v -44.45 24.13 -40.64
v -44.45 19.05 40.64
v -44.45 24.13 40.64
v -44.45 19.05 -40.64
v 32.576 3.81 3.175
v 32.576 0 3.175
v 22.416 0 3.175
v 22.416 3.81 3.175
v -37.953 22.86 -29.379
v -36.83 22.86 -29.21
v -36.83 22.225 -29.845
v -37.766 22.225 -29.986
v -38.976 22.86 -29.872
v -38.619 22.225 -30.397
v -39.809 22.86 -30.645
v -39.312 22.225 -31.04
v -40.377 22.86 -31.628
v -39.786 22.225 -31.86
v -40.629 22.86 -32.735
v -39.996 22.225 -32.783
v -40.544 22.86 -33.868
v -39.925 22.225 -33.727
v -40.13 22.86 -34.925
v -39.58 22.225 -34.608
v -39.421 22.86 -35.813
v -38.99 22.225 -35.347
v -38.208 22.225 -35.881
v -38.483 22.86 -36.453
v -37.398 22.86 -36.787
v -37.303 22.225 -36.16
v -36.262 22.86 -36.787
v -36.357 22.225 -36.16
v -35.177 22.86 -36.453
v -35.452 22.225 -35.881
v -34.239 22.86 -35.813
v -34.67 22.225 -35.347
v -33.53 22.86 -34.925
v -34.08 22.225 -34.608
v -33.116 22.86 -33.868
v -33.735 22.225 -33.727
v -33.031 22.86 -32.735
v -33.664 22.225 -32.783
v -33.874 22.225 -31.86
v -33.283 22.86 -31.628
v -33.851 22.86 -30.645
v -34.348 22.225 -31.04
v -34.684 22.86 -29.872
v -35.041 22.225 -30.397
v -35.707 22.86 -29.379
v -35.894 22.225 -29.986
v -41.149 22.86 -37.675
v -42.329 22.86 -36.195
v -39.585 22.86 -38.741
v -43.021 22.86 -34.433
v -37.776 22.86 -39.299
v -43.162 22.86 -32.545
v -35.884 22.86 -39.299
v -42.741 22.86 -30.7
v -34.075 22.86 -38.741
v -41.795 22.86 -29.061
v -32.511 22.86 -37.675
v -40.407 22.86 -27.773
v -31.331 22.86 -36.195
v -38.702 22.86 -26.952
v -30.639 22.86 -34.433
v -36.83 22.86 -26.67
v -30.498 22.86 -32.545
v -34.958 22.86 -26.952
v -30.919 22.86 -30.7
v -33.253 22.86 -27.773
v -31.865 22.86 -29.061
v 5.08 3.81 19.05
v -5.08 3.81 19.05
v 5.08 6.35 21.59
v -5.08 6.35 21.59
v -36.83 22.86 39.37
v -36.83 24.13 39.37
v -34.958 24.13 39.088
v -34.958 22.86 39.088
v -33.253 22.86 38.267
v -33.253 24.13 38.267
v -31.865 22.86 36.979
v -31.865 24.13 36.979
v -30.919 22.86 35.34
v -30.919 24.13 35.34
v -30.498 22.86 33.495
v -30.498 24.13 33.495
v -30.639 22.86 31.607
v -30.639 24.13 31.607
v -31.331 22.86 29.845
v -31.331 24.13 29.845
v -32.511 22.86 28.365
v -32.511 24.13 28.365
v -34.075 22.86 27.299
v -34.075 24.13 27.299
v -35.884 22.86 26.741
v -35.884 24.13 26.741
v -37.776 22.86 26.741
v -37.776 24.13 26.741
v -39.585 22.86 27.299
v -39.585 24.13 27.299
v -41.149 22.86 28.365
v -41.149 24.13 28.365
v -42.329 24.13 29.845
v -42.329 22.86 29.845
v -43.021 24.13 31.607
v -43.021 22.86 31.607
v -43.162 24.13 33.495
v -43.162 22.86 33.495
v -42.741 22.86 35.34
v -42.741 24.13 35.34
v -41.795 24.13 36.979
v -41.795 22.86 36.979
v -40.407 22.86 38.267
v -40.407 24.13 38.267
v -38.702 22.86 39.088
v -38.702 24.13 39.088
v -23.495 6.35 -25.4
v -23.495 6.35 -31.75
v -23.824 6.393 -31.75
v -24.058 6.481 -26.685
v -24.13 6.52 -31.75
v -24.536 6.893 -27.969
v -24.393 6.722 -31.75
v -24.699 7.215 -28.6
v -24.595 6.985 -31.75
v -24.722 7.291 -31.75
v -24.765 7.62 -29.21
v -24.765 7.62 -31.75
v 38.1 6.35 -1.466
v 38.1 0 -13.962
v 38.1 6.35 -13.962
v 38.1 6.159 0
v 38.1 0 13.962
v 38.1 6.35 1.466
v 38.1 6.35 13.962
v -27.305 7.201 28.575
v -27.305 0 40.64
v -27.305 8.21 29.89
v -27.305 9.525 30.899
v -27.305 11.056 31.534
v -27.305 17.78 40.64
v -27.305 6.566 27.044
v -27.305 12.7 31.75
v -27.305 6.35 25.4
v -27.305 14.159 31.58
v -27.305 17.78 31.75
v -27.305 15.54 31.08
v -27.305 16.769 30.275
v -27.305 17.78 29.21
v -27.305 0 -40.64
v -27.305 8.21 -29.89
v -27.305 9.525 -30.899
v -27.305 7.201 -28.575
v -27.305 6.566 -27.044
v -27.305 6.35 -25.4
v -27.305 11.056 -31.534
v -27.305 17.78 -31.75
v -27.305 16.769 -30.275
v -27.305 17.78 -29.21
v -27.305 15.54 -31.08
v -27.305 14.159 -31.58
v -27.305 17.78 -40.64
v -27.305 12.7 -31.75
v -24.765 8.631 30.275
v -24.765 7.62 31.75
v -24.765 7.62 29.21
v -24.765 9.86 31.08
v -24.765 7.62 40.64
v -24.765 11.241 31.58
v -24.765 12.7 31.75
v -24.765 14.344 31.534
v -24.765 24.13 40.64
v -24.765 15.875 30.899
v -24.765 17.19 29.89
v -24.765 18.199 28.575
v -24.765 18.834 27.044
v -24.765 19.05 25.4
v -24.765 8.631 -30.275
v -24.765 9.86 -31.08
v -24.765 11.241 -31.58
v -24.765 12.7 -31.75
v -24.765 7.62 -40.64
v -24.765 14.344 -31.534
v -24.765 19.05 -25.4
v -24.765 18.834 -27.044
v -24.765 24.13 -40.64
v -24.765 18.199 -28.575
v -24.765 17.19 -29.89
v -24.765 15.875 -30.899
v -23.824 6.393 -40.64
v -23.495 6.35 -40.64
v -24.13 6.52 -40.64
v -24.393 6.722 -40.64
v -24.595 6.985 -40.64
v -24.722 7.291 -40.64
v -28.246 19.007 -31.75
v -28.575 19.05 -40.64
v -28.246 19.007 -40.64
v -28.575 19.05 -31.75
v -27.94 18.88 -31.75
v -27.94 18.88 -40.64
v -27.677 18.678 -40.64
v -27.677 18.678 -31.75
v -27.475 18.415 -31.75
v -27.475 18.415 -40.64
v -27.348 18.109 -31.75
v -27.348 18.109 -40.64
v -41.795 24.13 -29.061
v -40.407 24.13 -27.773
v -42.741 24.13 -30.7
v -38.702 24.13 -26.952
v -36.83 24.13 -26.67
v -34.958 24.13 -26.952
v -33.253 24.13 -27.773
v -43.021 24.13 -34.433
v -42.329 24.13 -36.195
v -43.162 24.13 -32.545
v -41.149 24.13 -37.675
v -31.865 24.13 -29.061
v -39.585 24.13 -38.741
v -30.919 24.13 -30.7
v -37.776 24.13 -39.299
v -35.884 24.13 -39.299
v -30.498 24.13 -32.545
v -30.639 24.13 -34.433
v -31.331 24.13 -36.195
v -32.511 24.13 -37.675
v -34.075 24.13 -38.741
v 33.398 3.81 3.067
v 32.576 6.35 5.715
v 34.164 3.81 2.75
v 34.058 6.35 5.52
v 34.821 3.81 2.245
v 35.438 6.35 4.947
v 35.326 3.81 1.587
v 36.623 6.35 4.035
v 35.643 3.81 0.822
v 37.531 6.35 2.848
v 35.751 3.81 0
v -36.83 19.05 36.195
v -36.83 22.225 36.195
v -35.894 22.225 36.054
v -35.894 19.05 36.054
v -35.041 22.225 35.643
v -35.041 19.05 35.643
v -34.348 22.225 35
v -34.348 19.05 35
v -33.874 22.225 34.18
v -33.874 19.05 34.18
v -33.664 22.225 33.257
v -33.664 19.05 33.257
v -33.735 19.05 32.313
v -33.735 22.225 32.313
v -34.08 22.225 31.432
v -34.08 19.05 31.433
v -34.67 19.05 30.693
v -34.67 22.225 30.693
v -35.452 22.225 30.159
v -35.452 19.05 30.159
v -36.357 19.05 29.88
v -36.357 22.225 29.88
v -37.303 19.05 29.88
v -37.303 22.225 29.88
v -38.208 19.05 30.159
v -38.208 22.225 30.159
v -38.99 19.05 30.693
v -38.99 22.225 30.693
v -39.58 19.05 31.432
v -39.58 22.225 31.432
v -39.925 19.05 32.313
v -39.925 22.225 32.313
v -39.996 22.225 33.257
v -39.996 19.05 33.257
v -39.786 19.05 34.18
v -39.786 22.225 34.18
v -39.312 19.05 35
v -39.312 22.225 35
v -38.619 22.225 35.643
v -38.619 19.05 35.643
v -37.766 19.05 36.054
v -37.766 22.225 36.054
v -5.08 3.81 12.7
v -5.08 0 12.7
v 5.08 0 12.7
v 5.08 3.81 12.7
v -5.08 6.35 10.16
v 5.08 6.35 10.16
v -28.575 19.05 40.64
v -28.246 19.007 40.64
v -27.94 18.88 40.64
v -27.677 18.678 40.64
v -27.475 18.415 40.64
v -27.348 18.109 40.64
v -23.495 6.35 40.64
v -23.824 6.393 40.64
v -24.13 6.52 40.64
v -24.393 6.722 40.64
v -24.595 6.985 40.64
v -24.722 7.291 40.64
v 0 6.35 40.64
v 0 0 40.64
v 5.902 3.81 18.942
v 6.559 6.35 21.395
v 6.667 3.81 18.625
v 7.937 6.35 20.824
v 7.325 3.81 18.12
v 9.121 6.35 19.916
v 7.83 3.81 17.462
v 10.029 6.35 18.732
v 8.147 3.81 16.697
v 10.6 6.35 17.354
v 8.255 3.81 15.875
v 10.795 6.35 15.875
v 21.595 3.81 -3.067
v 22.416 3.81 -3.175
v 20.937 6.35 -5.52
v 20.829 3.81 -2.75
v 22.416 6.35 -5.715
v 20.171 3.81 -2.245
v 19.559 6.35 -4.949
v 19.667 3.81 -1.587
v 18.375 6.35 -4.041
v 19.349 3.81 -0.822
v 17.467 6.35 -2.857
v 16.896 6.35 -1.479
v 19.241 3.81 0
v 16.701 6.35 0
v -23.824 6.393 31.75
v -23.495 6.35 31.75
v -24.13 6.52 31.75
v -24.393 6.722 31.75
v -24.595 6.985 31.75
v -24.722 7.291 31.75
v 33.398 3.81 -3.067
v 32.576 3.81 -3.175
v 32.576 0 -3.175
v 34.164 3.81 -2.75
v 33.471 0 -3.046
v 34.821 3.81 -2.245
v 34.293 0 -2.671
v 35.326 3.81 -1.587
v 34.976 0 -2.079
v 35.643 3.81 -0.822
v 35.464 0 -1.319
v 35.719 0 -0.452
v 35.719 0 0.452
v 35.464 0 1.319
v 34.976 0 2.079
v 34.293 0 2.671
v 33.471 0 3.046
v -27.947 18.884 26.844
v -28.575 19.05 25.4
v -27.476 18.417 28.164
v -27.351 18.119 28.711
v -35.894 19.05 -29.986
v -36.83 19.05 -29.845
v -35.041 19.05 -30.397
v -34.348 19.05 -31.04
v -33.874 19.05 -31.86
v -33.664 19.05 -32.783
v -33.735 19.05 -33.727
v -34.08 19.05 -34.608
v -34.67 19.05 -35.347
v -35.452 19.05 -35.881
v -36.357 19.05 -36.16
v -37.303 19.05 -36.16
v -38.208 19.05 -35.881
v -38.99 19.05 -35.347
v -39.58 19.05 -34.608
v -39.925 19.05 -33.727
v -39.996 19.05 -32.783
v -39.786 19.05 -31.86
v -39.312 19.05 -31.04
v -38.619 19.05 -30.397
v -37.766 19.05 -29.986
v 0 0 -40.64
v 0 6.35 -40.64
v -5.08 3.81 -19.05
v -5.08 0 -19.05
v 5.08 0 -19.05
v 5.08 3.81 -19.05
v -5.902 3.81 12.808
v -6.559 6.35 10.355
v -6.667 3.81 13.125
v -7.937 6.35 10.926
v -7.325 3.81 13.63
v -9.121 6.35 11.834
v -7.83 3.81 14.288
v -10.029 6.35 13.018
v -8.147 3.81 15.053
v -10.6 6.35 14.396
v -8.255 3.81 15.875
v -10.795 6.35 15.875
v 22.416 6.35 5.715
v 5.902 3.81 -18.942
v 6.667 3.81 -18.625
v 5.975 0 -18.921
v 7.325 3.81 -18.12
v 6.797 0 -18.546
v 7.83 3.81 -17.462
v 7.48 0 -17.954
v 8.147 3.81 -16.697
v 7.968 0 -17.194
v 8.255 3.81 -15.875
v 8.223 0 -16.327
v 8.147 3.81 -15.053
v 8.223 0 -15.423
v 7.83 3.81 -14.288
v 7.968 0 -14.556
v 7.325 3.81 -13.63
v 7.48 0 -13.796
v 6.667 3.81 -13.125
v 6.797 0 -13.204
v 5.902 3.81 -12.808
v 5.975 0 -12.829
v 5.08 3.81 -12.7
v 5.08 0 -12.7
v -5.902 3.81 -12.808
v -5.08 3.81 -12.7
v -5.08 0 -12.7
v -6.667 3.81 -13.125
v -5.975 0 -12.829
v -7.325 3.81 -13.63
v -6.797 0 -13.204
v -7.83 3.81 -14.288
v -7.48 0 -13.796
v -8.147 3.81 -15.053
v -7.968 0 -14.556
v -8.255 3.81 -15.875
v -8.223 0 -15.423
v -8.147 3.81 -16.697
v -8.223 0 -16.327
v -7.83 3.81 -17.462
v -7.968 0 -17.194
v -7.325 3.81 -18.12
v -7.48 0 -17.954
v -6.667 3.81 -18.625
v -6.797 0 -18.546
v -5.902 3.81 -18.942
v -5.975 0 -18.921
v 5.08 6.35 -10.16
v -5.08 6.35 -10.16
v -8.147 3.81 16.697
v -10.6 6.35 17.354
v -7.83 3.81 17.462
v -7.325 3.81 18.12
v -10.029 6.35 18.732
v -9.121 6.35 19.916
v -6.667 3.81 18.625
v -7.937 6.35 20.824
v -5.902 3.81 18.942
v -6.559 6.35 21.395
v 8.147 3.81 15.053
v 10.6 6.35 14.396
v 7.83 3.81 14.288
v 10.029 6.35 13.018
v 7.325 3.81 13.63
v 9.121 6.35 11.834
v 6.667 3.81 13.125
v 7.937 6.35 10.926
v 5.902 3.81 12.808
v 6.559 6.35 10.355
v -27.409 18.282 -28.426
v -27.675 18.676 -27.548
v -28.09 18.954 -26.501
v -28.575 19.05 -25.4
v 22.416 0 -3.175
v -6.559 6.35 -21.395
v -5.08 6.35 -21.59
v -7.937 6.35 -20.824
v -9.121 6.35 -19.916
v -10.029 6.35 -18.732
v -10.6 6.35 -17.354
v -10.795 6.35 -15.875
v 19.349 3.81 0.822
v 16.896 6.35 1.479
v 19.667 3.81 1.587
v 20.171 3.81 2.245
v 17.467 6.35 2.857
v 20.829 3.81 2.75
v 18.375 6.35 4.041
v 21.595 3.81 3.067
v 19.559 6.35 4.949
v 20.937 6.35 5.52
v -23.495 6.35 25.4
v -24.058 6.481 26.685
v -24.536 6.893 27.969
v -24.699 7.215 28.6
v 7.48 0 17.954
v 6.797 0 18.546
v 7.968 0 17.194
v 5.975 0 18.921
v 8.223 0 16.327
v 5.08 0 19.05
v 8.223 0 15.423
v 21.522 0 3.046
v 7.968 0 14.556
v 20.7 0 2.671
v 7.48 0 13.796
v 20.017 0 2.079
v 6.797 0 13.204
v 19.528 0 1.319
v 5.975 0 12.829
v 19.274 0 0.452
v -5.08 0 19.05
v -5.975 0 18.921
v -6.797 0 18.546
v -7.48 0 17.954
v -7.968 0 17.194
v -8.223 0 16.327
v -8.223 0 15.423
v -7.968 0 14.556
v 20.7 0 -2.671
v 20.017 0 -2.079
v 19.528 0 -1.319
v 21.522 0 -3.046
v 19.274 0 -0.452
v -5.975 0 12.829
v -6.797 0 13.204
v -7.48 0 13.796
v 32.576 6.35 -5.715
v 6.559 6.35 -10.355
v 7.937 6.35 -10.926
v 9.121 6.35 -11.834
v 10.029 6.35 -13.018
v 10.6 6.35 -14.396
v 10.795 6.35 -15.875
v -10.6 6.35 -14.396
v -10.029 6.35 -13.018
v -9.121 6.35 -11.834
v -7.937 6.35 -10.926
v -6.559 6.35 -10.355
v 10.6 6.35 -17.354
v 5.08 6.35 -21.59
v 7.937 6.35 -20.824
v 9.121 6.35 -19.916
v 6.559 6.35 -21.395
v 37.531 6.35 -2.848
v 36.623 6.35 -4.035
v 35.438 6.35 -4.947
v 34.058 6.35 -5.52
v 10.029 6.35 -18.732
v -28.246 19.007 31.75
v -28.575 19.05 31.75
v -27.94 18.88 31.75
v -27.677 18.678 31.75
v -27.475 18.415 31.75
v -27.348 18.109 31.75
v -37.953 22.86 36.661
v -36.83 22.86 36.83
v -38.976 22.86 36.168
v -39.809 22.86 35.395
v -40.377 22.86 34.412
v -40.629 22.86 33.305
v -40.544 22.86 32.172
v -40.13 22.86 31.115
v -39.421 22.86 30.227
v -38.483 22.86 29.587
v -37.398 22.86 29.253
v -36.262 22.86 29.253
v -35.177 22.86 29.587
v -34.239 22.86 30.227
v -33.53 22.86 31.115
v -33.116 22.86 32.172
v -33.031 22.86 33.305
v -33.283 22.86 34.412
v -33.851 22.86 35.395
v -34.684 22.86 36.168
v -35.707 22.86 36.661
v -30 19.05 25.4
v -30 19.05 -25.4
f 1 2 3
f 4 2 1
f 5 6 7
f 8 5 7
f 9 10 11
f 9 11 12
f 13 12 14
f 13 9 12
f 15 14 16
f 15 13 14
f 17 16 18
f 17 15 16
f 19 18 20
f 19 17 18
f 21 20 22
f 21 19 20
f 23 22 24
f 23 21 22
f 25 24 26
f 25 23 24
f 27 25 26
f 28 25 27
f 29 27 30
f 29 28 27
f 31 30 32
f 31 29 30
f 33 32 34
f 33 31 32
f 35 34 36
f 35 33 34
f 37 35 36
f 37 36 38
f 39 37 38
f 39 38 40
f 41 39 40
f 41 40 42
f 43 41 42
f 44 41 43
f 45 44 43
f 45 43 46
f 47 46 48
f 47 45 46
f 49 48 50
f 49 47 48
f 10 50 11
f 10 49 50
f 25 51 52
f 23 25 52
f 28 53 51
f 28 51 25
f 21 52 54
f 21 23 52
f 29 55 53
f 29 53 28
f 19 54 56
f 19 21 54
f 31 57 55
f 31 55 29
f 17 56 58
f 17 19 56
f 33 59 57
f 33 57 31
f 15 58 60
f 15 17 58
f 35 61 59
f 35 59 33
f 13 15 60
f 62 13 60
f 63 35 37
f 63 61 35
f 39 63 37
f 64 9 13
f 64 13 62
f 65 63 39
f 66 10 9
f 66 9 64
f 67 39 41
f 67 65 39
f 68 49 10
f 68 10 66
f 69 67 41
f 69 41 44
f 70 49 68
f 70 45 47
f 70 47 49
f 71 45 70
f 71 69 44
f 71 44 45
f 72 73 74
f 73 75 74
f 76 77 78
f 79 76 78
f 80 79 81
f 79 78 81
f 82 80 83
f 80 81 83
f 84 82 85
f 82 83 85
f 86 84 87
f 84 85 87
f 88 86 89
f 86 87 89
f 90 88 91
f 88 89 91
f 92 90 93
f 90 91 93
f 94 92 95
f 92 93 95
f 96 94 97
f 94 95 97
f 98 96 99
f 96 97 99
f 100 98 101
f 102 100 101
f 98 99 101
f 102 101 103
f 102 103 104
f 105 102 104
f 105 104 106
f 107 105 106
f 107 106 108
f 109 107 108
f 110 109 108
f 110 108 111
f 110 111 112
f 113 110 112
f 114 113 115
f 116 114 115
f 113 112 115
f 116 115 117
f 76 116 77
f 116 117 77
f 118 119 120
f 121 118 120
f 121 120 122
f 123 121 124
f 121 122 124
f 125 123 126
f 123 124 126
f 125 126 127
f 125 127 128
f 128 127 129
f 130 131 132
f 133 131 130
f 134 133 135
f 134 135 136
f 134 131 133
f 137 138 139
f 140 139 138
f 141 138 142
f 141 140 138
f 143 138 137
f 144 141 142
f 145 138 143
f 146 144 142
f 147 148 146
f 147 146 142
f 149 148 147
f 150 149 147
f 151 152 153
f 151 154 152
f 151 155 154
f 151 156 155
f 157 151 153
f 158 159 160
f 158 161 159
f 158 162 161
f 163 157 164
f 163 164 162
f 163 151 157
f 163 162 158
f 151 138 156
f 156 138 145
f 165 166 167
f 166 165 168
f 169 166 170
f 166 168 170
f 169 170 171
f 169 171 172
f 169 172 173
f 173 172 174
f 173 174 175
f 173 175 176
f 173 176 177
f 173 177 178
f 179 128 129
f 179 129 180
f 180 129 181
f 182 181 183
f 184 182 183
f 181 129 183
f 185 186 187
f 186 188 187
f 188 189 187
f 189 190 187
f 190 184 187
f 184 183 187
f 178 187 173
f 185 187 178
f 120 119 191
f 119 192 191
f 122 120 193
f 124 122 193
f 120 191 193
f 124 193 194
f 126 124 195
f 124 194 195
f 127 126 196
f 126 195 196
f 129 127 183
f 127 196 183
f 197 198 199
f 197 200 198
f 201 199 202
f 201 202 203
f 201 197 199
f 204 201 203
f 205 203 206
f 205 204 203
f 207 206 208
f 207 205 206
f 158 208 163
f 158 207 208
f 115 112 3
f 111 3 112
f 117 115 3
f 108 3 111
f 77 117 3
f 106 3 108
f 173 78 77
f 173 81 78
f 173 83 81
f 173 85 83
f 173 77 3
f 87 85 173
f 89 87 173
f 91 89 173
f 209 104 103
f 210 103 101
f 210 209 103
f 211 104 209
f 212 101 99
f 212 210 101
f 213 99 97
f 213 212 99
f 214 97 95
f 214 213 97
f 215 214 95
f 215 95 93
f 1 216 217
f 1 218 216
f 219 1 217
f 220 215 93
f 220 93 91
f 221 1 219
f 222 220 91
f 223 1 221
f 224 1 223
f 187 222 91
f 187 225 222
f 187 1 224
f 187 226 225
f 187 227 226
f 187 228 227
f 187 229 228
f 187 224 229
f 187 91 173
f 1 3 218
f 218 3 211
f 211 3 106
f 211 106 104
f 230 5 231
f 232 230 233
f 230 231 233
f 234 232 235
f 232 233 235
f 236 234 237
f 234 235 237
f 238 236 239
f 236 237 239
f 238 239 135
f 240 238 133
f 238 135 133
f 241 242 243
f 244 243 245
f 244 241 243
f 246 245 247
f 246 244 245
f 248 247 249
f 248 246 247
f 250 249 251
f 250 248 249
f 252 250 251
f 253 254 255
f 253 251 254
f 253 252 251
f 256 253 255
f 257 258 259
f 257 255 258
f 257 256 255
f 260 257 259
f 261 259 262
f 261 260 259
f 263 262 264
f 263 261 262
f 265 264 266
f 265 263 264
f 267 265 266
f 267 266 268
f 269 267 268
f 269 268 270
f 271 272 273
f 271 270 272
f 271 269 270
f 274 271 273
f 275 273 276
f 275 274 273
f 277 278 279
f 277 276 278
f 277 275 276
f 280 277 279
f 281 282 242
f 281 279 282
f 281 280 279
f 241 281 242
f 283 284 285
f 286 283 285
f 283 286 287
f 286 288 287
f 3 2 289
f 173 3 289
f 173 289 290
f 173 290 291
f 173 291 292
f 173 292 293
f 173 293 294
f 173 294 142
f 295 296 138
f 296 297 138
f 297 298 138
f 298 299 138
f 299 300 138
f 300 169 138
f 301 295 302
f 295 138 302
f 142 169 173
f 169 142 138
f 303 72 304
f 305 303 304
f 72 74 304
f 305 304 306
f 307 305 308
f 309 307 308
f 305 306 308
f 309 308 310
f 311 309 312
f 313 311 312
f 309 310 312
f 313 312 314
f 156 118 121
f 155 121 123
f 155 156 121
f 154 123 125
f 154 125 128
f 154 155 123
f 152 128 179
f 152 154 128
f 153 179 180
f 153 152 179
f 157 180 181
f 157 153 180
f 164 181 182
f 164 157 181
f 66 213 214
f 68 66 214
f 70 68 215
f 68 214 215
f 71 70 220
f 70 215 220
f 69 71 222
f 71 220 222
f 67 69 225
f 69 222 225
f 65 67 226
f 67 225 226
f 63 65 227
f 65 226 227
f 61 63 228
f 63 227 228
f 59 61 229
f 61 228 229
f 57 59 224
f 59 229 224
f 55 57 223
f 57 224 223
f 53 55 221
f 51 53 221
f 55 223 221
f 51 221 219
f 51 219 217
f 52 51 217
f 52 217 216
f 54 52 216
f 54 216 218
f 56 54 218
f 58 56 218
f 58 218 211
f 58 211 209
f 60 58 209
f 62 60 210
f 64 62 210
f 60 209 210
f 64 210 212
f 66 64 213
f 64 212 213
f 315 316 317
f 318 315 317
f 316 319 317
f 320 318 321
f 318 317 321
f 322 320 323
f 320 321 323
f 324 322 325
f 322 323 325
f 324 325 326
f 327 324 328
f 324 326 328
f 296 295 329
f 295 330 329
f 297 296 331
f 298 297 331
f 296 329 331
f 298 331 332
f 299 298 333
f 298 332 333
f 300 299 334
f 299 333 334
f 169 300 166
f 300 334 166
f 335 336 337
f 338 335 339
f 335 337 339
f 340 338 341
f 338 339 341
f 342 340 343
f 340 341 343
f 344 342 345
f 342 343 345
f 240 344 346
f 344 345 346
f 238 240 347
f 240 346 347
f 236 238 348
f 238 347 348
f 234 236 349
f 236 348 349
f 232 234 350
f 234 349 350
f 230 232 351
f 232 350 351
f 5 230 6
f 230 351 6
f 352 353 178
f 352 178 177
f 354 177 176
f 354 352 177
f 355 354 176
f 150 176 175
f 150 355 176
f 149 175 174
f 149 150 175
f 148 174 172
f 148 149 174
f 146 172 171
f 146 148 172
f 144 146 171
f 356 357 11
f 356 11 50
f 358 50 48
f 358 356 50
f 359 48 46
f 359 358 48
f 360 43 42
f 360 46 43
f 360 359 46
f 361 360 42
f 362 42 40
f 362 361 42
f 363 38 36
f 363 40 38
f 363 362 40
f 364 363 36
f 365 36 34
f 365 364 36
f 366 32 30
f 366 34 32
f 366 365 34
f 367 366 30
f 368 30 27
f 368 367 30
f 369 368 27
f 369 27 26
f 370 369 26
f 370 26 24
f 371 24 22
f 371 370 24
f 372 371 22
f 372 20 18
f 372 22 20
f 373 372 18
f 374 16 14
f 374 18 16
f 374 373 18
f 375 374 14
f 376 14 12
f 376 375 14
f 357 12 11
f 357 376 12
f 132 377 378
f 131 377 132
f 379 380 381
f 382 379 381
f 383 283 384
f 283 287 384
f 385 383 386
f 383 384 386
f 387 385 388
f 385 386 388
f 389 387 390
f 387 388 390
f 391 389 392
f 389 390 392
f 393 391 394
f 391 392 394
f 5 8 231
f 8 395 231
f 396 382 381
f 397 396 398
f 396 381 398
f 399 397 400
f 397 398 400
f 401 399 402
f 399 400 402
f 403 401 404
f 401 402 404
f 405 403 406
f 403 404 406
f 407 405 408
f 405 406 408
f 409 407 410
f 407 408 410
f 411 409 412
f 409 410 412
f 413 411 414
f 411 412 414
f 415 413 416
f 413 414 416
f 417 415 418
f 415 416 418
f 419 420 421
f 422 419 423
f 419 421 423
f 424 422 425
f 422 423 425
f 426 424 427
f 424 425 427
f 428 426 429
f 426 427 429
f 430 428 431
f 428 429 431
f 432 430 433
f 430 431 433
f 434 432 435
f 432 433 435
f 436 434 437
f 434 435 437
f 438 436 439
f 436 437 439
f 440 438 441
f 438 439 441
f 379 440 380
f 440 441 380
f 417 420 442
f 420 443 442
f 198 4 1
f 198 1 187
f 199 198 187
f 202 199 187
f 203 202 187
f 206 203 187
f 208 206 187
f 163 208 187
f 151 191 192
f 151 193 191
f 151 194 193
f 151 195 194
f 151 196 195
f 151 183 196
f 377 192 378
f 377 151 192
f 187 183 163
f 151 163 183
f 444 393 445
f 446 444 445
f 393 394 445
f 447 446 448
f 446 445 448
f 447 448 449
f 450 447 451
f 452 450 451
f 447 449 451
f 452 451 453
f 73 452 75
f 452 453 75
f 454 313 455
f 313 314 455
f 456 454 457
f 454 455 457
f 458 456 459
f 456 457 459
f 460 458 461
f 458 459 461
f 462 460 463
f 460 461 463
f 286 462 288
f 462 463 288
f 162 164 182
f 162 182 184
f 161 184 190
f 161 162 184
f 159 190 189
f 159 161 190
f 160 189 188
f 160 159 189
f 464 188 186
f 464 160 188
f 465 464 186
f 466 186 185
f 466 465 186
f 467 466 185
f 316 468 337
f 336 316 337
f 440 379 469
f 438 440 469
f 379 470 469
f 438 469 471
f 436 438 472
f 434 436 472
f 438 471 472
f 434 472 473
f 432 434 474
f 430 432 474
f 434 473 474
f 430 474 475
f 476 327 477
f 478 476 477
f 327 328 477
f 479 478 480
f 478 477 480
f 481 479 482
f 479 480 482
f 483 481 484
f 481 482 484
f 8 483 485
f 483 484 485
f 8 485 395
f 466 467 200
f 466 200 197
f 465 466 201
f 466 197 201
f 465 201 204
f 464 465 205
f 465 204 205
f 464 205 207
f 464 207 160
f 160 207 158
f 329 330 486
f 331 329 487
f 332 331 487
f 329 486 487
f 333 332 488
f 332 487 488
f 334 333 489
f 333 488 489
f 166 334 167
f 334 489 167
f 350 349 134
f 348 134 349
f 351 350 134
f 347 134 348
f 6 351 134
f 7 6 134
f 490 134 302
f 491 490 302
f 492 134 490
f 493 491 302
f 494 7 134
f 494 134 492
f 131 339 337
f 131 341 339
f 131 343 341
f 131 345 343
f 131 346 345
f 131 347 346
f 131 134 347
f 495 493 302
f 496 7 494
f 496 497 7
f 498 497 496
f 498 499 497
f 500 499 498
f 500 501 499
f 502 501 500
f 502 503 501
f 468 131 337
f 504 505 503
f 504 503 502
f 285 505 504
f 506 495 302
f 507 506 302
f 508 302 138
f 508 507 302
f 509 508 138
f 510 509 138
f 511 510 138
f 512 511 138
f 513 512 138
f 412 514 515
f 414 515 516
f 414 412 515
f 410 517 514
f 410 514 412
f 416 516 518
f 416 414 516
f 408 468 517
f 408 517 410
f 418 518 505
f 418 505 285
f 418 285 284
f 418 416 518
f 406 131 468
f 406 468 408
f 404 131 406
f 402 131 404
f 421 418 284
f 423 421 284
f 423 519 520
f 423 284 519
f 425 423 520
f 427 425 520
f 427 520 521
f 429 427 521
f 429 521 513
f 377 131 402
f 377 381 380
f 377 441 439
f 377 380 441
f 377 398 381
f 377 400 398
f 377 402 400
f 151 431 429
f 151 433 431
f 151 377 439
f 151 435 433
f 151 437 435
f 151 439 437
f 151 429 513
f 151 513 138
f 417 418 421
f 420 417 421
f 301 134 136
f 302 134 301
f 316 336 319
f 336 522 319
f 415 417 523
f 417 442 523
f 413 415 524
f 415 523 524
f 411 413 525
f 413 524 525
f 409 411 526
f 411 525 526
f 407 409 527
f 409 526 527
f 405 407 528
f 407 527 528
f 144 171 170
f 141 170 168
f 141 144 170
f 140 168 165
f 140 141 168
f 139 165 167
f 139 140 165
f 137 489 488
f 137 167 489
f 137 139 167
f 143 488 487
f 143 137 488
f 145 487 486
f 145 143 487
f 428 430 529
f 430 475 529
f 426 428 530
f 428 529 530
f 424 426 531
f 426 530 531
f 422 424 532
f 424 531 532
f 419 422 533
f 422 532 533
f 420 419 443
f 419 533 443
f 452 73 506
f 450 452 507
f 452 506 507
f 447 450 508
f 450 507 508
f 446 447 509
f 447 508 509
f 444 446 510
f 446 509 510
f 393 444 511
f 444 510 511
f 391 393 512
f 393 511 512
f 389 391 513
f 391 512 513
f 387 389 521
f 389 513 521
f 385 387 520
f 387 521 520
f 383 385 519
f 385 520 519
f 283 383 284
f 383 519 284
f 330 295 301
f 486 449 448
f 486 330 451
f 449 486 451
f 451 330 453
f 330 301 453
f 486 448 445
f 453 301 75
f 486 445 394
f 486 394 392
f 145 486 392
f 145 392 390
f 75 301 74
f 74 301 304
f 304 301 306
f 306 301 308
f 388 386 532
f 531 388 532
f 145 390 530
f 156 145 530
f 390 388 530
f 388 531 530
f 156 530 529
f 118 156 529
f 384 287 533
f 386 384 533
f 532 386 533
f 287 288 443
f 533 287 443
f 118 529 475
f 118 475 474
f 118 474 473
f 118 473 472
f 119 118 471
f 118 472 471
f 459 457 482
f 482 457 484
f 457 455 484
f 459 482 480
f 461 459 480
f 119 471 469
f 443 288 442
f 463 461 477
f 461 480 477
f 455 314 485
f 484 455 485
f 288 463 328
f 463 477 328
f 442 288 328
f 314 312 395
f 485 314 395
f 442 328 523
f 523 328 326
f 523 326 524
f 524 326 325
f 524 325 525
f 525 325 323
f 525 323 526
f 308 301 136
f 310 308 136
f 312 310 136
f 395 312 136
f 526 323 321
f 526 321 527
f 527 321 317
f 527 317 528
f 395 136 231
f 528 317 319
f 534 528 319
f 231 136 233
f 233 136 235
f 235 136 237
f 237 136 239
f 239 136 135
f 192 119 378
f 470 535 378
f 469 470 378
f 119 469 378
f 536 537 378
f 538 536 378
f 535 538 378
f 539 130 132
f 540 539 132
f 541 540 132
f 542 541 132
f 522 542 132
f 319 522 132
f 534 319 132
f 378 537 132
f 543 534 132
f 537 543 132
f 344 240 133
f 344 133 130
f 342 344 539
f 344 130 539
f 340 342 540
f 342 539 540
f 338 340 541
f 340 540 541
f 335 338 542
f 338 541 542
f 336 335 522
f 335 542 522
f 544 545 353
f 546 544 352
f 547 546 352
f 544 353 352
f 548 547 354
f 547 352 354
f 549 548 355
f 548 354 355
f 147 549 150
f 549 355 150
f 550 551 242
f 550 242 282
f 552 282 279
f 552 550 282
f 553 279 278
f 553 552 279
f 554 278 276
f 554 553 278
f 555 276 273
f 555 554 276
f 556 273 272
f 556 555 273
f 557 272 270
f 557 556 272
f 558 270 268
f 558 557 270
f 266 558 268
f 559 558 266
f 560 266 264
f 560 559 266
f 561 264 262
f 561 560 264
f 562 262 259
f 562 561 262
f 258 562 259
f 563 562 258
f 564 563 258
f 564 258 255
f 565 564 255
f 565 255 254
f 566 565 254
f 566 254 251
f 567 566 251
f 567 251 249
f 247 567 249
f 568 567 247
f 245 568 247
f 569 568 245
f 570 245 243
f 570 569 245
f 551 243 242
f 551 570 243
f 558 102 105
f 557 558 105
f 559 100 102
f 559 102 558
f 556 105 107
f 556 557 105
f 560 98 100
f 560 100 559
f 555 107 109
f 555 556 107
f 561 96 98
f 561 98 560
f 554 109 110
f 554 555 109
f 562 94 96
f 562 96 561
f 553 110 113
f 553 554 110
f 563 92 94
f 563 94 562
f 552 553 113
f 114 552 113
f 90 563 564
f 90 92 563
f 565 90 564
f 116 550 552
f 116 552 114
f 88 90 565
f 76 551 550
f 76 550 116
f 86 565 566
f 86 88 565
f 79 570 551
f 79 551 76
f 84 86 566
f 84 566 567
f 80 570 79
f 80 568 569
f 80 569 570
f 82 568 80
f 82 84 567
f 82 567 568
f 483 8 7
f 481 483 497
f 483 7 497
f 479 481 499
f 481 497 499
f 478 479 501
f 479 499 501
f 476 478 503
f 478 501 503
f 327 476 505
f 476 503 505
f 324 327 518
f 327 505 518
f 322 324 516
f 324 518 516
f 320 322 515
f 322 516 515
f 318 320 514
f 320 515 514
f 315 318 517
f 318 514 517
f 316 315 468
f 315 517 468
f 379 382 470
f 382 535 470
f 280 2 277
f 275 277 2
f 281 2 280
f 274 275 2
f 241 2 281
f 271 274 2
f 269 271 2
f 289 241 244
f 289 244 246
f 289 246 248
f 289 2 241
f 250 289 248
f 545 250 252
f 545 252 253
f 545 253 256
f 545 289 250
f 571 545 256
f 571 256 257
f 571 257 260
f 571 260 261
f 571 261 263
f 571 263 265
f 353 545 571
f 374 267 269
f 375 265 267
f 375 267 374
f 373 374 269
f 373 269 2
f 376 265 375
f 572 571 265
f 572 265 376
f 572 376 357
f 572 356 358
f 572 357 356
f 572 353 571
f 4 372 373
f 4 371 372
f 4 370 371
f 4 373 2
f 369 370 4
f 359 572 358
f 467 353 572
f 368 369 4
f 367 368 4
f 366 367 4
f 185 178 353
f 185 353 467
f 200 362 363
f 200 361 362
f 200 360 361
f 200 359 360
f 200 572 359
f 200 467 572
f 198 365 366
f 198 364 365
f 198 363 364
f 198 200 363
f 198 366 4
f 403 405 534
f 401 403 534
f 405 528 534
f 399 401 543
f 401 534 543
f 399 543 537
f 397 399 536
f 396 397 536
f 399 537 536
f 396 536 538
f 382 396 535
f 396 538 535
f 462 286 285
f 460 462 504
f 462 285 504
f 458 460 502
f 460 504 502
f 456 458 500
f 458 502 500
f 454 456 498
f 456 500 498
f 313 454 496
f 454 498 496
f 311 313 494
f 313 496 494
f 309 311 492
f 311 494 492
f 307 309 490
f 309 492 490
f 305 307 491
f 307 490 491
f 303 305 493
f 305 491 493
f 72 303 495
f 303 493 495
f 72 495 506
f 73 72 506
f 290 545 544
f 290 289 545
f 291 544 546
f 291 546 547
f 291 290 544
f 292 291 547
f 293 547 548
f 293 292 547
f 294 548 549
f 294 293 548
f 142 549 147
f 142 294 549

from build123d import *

# Parameters (mm, degrees)
SKETCH1_R           = 3.175
BOSS_EXTRUDE1_DEPTH = 6.35
SKETCH10_W          = 19.685
SKETCH10_H          = 81.28
SKETCH10_R          = 3.175
BOSS_EXTRUDE4_DEPTH = 17.78
SKETCH12_W          = 17.145
SKETCH12_H          = 81.28
CUT_EXTRUDE5_DEPTH  = 12.7
SKETCH14_R          = 6.35
CUT_EXTRUDE9_DEPTH  = 1.27
CHAMFER2_SIZE       = 0.635
SKETCH15_W          = 63.5
SKETCH15_H          = 12.7
CUT_EXTRUDE10_DEPTH = 36.576
SKETCH16_W          = 17.145
SKETCH16_H          = 6.35
CUT_EXTRUDE11_DEPTH = 84.836
FILLET1_R           = 1.27
FILLET2_START       = -31.75
FILLET2_DEPTH       = 6.3500001
FILLET2_START_2     = 25.3999999
FILLET2_2_DEPTH     = 6.3500001
FILLET2_START_3     = -30
FILLET2_3_DEPTH     = 6.505


with BuildPart() as part:
    # Sketch1 → Boss-Extrude1 (new body)
    with BuildSketch(Plane(origin=(0, 0, 0), x_dir=(1, 0, 0), z_dir=(0, 1, 0))):
        Polygon((0, 40.64), (38.1, 13.962092794), (38.1, -13.962092794), (0, -40.64), (-44.45, -40.64), (-44.45, 40.64), align=None)
        with Locations(Location((-36.83, 33.02, 0), (0, 0, 270))):
            Circle(SKETCH1_R, mode=Mode.SUBTRACT)
        with Locations(Location((-36.83, -33.02, 0), (0, 0, 270))):
            Circle(SKETCH1_R, mode=Mode.SUBTRACT)
        with BuildLine():
            Line((-5.08, 19.05), (5.08, 19.05))
            ThreePointArc((5.08, 19.05), (8.255, 15.875), (5.08, 12.7))
            Line((5.08, 12.7), (-5.08, 12.7))
            ThreePointArc((-5.08, 12.7), (-8.255, 15.875), (-5.08, 19.05))
        make_face(mode=Mode.SUBTRACT)
        with BuildLine():
            Line((-5.08, -12.7), (5.08, -12.7))
            ThreePointArc((5.08, -12.7), (8.255, -15.875), (5.08, -19.05))
            Line((5.08, -19.05), (-5.08, -19.05))
            ThreePointArc((-5.08, -19.05), (-8.255, -15.875), (-5.08, -12.7))
        make_face(mode=Mode.SUBTRACT)
        with BuildLine():
            Line((22.41630657, 3.175), (32.57630657, 3.175))
            ThreePointArc((32.57630657, 3.175), (35.75130657, 0), (32.57630657, -3.175))
            Line((32.57630657, -3.175), (22.41630657, -3.175))
            ThreePointArc((22.41630657, -3.175), (19.24130657, 0), (22.41630657, 3.175))
        make_face(mode=Mode.SUBTRACT)
    extrude(amount=BOSS_EXTRUDE1_DEPTH)

    # Sketch10 → Boss-Extrude4 (add)
    with BuildSketch(Plane(origin=(0, 6.35, 0), x_dir=(1, 0, 0), z_dir=(0, 1, 0))):
        with Locations((-34.6075, 0)):
            Rectangle(SKETCH10_W, SKETCH10_H)
        with Locations(Location((-36.83, -33.02, 0), (0, 0, 270))):
            Circle(SKETCH10_R, mode=Mode.SUBTRACT)
        with Locations(Location((-36.83, 33.02, 0), (0, 0, 270))):
            Circle(SKETCH10_R, mode=Mode.SUBTRACT)
    extrude(amount=BOSS_EXTRUDE4_DEPTH)

    # Sketch12 → Cut-Extrude5 (cut)
    with BuildSketch(Plane.XZ):
        with Locations((-35.8775, 0)):
            Rectangle(SKETCH12_W, SKETCH12_H)
    extrude(amount=-CUT_EXTRUDE5_DEPTH, mode=Mode.SUBTRACT)

    # Sketch14 → Cut-Extrude9 (cut)
    with BuildSketch(Plane(origin=(0, 24.13, 0), x_dir=(1, 0, 0), z_dir=(0, 1, 0))):
        with Locations(Location((-36.83, 33.02, 0), (0, 0, 270))):
            Circle(SKETCH14_R)
        with Locations(Location((-36.83, -33.02, 0), (0, 0, 270))):
            Circle(SKETCH14_R)
    extrude(amount=-CUT_EXTRUDE9_DEPTH, mode=Mode.SUBTRACT)

    # Chamfer2
    chamfer2_edges = [part.edges().sort_by_distance(p)[0] for p in [
        (-36.83, 22.86, -36.195),
        (-36.83, 22.86, 29.845),
    ]]
    chamfer(chamfer2_edges, length=CHAMFER2_SIZE)

    # Sketch15 → Cut-Extrude10 (cut)
    with BuildSketch(Plane(origin=(-24.765, 0, 0), x_dir=(0, 0, -1), z_dir=(1, 0, 0))):
        with Locations((0, 12.7)):
            Rectangle(SKETCH15_W, SKETCH15_H)
    extrude(amount=-CUT_EXTRUDE10_DEPTH, mode=Mode.SUBTRACT)

    # Sketch16 → Cut-Extrude11 (cut)
    with BuildSketch(Plane(origin=(0, 0, -40.64), x_dir=(-1, 0, 0), z_dir=(0, 0, -1))):
        with Locations((35.8775, 15.875)):
            Rectangle(SKETCH16_W, SKETCH16_H)
    extrude(amount=-CUT_EXTRUDE11_DEPTH, mode=Mode.SUBTRACT)

    # Fillet1
    fillet1_edges = [part.edges().sort_by_distance(p)[0] for p in [
        (-24.765, 6.35, -36.195),
        (-27.305, 19.05, 36.195),
        (-27.305, 19.05, -36.195),
        (-24.765, 6.35, 36.195),
    ]]
    fillet(fillet1_edges, radius=FILLET1_R)

    # Fillet2: read off the stored shape, not the designer's step
    # Fillet2 outline → Fillet2 (add)
    with BuildSketch(Plane.XY.offset(FILLET2_START)):
        with BuildLine():
            ThreePointArc((-23.495, 6.35), (-24.393025612, 6.721974388), (-24.765, 7.62))
            Line((-24.765, 7.62), (-24.765, 19.05))
            Line((-24.765, 19.05), (-28.575, 19.05))
            ThreePointArc((-28.575, 19.05), (-27.676974388, 18.678025612), (-27.305, 17.78))
            Line((-27.305, 17.78), (-27.305, 6.35))
            Line((-27.305, 6.35), (-23.495, 6.35))
        make_face()
    extrude(amount=FILLET2_DEPTH)

    # Fillet2 2 outline → Fillet2 2 (add)
    with BuildSketch(Plane.XY.offset(FILLET2_START_2)):
        with BuildLine():
            ThreePointArc((-23.495, 6.35), (-24.393025612, 6.721974388), (-24.765, 7.62))
            Line((-24.765, 7.62), (-24.765, 19.05))
            Line((-24.765, 19.05), (-28.575, 19.05))
            ThreePointArc((-28.575, 19.05), (-27.676974388, 18.678025612), (-27.305, 17.78))
            Line((-27.305, 17.78), (-27.305, 6.35))
            Line((-27.305, 6.35), (-23.495, 6.35))
        make_face()
    extrude(amount=FILLET2_2_DEPTH)

    # Fillet2 3 outline → Fillet2 3 (cut)
    with BuildSketch(Plane.YZ.offset(FILLET2_START_3)):
        with BuildLine():
            ThreePointArc((19.05, 25.4), (17.190128061, 29.890128061), (12.7, 31.75))
            ThreePointArc((12.7, 31.75), (8.209871939, 29.890128061), (6.35, 25.4))
            Line((6.35, 25.4), (19.05, 25.4))
        make_face()
        with BuildLine():
            ThreePointArc((12.7, -31.75), (17.190128061, -29.890128061), (19.05, -25.4))
            Line((19.05, -25.4), (6.35, -25.4))
            ThreePointArc((6.35, -25.4), (8.209871939, -29.890128061), (12.7, -31.75))
        make_face()
    extrude(amount=FILLET2_3_DEPTH, mode=Mode.SUBTRACT)

    # Chamfer3: read off the stored shape, not the designer's step
    # Chamfer3: loft between two sections, ruled curve by curve
    chamfer3_from = [
        Edge.make_three_point_arc((-5.08, 3.81, 12.7), (-7.32506403, 3.81, 13.62993597), (-8.255, 3.81, 15.875)),
        Edge.make_three_point_arc((-8.255, 3.81, 15.875), (-7.32506403, 3.81, 18.12006403), (-5.08, 3.81, 19.05)),
        Edge.make_three_point_arc((5.08, 3.81, 19.05), (7.32506403, 3.81, 18.12006403), (8.255, 3.81, 15.875)),
        Edge.make_three_point_arc((8.255, 3.81, 15.875), (7.32506403, 3.81, 13.62993597), (5.08, 3.81, 12.7)),
        Edge.make_line((5.08, 3.81, 12.7), (-5.08, 3.81, 12.7)),
        Edge.make_line((-5.08, 3.81, 19.05), (5.08, 3.81, 19.05)),
    ]
    chamfer3_to = [
        Edge.make_three_point_arc((-5.08, 6.35, 10.16), (-9.121115254, 6.35, 11.833884746), (-10.795, 6.35, 15.875)),
        Edge.make_three_point_arc((-10.795, 6.35, 15.875), (-9.121115254, 6.35, 19.916115254), (-5.08, 6.35, 21.59)),
        Edge.make_three_point_arc((5.08, 6.35, 21.59), (9.121115254, 6.35, 19.916115254), (10.795, 6.35, 15.875)),
        Edge.make_three_point_arc((10.795, 6.35, 15.875), (9.121115254, 6.35, 11.833884746), (5.08, 6.35, 10.16)),
        Edge.make_line((5.08, 6.35, 10.16), (-5.08, 6.35, 10.16)),
        Edge.make_line((-5.08, 6.35, 21.59), (5.08, 6.35, 21.59)),
    ]
    chamfer3 = Solid(Shell([*[Face.make_surface_from_curves(chamfer3_from[k], chamfer3_to[k]) for k in range(6)], Face(Wire(chamfer3_from)), Face(Wire(chamfer3_to))]))
    add(chamfer3, mode=Mode.SUBTRACT)

    # Chamfer3 2: loft between two sections, ruled curve by curve
    chamfer3_2_from = [
        Edge.make_three_point_arc((22.41630657, 3.81, -3.175), (20.17124254, 3.81, -2.24506403), (19.24130657, 3.81, 0)),
        Edge.make_three_point_arc((19.24130657, 3.81, 0), (20.17124254, 3.81, 2.24506403), (22.41630657, 3.81, 3.175)),
        Edge.make_three_point_arc((32.57630657, 3.81, 3.175), (34.8213706, 3.81, 2.24506403), (35.75130657, 3.81, 0)),
        Edge.make_three_point_arc((35.75130657, 3.81, 0), (34.8213706, 3.81, -2.24506403), (32.57630657, 3.81, -3.175)),
        Edge.make_line((32.57630657, 3.81, -3.175), (22.41630657, 3.81, -3.175)),
        Edge.make_line((22.41630657, 3.81, 3.175), (32.57630657, 3.81, 3.175)),
    ]
    chamfer3_2_to = [
        Edge.make_three_point_arc((22.41630657, 6.35, -5.715), (18.375191316, 6.35, -4.041115254), (16.70130657, 6.35, 0)),
        Edge.make_three_point_arc((16.70130657, 6.35, 0), (18.375191316, 6.35, 4.041115254), (22.41630657, 6.35, 5.715)),
        Edge.make_three_point_arc((32.57630657, 6.35, 5.715), (36.617421825, 6.35, 4.041115254), (38.29130657, 6.35, 0)),
        Edge.make_three_point_arc((38.29130657, 6.35, 0), (36.617421825, 6.35, -4.041115254), (32.57630657, 6.35, -5.715)),
        Edge.make_line((32.57630657, 6.35, -5.715), (22.41630657, 6.35, -5.715)),
        Edge.make_line((22.41630657, 6.35, 5.715), (32.57630657, 6.35, 5.715)),
    ]
    chamfer3_2 = Solid(Shell([*[Face.make_surface_from_curves(chamfer3_2_from[k], chamfer3_2_to[k]) for k in range(6)], Face(Wire(chamfer3_2_from)), Face(Wire(chamfer3_2_to))]))
    add(chamfer3_2, mode=Mode.SUBTRACT)

    # Chamfer3 3: loft between two sections, ruled curve by curve
    chamfer3_3_from = [
        Edge.make_three_point_arc((-5.08, 3.81, -19.05), (-7.32506403, 3.81, -18.12006403), (-8.255, 3.81, -15.875)),
        Edge.make_three_point_arc((-8.255, 3.81, -15.875), (-7.32506403, 3.81, -13.62993597), (-5.08, 3.81, -12.7)),
        Edge.make_three_point_arc((5.08, 3.81, -12.7), (7.32506403, 3.81, -13.62993597), (8.255, 3.81, -15.875)),
        Edge.make_three_point_arc((8.255, 3.81, -15.875), (7.32506403, 3.81, -18.12006403), (5.08, 3.81, -19.05)),
        Edge.make_line((5.08, 3.81, -19.05), (-5.08, 3.81, -19.05)),
        Edge.make_line((-5.08, 3.81, -12.7), (5.08, 3.81, -12.7)),
    ]
    chamfer3_3_to = [
        Edge.make_three_point_arc((-5.08, 6.35, -21.59), (-9.121115254, 6.35, -19.916115254), (-10.795, 6.35, -15.875)),
        Edge.make_three_point_arc((-10.795, 6.35, -15.875), (-9.121115254, 6.35, -11.833884746), (-5.08, 6.35, -10.16)),
        Edge.make_three_point_arc((5.08, 6.35, -10.16), (9.121115254, 6.35, -11.833884746), (10.795, 6.35, -15.875)),
        Edge.make_three_point_arc((10.795, 6.35, -15.875), (9.121115254, 6.35, -19.916115254), (5.08, 6.35, -21.59)),
        Edge.make_line((5.08, 6.35, -21.59), (-5.08, 6.35, -21.59)),
        Edge.make_line((-5.08, 6.35, -10.16), (5.08, 6.35, -10.16)),
    ]
    chamfer3_3 = Solid(Shell([*[Face.make_surface_from_curves(chamfer3_3_from[k], chamfer3_3_to[k]) for k in range(6)], Face(Wire(chamfer3_3_from)), Face(Wire(chamfer3_3_to))]))
    add(chamfer3_3, mode=Mode.SUBTRACT)


solid = part.part
